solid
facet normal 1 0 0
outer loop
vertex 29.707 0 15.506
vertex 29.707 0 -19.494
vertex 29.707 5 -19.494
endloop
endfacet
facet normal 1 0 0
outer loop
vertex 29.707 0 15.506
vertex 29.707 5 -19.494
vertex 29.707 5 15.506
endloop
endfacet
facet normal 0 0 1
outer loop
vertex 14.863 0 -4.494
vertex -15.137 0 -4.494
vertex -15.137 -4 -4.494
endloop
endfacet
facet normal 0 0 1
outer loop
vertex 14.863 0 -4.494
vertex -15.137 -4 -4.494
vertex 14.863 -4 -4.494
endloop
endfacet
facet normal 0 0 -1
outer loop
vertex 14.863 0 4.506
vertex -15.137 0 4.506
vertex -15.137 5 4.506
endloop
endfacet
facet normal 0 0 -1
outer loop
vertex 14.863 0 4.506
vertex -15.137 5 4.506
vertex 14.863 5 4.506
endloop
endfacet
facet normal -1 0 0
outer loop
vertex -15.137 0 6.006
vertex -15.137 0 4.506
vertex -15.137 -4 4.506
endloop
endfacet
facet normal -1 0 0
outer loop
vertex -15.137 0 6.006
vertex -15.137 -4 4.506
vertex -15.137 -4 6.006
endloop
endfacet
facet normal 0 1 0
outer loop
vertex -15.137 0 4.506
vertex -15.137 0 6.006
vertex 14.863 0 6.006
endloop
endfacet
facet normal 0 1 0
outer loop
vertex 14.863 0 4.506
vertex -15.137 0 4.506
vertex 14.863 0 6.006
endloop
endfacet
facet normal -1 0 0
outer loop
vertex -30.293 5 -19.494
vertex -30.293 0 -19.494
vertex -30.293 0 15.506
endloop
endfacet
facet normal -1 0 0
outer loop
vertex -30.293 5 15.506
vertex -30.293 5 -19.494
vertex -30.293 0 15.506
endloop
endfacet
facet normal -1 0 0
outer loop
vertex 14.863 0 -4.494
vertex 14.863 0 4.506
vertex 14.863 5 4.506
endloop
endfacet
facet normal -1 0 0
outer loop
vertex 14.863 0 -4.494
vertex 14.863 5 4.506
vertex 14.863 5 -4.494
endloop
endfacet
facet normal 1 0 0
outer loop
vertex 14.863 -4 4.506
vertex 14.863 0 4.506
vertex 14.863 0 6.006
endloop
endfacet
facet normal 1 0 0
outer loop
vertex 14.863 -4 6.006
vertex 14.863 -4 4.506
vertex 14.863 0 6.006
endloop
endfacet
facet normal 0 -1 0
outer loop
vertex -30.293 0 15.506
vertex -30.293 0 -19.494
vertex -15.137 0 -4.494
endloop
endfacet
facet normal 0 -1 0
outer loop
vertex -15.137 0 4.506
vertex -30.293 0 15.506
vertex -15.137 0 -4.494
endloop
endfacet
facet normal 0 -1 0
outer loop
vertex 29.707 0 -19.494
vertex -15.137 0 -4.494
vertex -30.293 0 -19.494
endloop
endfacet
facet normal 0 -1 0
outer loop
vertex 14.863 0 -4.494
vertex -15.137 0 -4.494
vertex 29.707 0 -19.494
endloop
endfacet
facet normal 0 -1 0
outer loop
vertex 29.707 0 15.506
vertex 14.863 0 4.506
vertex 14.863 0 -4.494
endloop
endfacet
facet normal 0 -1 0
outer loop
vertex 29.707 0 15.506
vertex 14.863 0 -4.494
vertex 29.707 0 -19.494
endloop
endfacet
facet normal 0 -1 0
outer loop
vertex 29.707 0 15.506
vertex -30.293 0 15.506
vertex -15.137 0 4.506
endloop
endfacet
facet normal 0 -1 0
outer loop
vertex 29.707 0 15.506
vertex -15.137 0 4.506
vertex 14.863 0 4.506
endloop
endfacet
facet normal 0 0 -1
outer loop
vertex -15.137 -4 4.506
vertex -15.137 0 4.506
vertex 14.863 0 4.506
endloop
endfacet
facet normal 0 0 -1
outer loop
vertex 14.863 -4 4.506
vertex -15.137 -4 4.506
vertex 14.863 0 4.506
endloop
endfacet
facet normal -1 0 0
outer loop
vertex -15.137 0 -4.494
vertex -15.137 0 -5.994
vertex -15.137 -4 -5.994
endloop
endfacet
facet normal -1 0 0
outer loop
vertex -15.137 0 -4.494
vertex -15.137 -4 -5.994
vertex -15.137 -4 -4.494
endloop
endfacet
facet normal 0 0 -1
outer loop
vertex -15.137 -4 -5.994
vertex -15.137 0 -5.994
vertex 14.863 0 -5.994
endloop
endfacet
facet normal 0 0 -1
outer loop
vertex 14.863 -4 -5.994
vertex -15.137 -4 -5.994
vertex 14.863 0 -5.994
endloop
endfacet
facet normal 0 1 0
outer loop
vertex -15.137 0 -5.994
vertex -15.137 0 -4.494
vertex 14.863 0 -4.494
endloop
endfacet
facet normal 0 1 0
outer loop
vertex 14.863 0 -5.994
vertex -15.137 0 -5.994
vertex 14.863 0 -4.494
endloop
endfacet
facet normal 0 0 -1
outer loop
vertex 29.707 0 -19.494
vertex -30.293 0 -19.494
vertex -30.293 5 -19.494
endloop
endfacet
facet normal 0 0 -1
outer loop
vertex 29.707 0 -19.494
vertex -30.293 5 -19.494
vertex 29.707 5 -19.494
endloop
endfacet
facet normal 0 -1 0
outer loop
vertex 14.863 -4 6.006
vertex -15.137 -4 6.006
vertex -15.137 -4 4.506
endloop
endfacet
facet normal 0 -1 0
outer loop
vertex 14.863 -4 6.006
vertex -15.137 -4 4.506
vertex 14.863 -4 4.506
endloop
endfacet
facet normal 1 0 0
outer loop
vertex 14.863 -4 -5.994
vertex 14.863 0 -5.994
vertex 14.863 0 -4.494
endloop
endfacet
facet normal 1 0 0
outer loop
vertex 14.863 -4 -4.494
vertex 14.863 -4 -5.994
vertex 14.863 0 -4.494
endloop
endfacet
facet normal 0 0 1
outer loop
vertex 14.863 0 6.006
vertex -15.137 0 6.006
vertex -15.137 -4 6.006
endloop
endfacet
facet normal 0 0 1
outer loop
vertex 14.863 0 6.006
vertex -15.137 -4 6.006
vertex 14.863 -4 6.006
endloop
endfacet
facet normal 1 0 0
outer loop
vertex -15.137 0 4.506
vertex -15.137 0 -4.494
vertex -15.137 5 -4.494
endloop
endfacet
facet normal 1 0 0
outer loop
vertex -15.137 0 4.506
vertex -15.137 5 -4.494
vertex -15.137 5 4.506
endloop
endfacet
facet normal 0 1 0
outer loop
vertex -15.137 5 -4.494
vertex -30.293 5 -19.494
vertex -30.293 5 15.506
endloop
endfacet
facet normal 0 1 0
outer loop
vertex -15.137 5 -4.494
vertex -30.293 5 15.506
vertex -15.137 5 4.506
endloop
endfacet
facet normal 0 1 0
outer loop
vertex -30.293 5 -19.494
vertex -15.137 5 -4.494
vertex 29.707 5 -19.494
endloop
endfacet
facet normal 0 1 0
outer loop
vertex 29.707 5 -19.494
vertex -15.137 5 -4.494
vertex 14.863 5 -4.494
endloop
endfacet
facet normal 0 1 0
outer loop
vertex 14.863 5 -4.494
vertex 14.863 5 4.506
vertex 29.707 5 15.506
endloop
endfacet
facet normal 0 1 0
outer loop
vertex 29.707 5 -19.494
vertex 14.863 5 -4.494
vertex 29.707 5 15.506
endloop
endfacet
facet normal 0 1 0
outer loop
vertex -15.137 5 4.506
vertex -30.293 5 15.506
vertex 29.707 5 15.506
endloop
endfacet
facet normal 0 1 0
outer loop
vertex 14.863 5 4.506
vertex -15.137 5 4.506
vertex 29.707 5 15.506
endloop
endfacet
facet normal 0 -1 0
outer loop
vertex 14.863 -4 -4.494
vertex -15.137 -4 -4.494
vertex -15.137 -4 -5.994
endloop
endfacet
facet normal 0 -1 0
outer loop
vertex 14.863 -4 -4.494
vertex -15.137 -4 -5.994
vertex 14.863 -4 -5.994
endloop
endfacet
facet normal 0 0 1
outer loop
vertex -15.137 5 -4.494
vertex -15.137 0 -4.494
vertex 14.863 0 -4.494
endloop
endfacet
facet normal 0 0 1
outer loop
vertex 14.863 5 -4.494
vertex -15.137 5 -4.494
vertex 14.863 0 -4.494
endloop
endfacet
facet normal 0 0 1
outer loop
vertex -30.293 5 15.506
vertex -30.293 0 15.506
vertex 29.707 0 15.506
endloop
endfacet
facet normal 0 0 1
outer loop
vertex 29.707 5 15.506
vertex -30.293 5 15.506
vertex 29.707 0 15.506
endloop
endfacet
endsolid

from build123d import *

# Parameters (mm, degrees)
F0_W     = 30
F0_H     = 1.5
F1_DEPTH = 4
F0_W_2   = 60
F0_H_2   = 35
F2_DEPTH = 5


with BuildPart() as f1:
    # F0 (on Front) → F1 (new body)
    with BuildSketch(Plane.XZ):
        with Locations((-0.136821, 5.2556)):
            Rectangle(F0_W, F0_H)
        with Locations((-0.136821, -5.2444)):
            Rectangle(F0_W, F0_H)
    extrude(amount=F1_DEPTH)


with BuildPart() as f2:
    # F0 (on Front) → F2 (new body)
    with BuildSketch(Plane.XZ):
        with Locations((-0.292571, -1.9944)):
            Rectangle(F0_W_2, F0_H_2)
        Polygon((-15.136821, 4.5056), (-15.136821, 6.0056), (14.863179, 6.0056), (14.863179, 4.5056), (14.863179, -4.4944), (14.863179, -5.9944), (-15.136821, -5.9944), (-15.136821, -4.4944), align=None, mode=Mode.SUBTRACT)
        with Locations((-0.136821, 5.2556)):
            Rectangle(F0_W, F0_H)
        with Locations((-0.136821, -5.2444)):
            Rectangle(F0_W, F0_H)
    extrude(amount=-F2_DEPTH)


solid = Compound([f1.part, f2.part])
